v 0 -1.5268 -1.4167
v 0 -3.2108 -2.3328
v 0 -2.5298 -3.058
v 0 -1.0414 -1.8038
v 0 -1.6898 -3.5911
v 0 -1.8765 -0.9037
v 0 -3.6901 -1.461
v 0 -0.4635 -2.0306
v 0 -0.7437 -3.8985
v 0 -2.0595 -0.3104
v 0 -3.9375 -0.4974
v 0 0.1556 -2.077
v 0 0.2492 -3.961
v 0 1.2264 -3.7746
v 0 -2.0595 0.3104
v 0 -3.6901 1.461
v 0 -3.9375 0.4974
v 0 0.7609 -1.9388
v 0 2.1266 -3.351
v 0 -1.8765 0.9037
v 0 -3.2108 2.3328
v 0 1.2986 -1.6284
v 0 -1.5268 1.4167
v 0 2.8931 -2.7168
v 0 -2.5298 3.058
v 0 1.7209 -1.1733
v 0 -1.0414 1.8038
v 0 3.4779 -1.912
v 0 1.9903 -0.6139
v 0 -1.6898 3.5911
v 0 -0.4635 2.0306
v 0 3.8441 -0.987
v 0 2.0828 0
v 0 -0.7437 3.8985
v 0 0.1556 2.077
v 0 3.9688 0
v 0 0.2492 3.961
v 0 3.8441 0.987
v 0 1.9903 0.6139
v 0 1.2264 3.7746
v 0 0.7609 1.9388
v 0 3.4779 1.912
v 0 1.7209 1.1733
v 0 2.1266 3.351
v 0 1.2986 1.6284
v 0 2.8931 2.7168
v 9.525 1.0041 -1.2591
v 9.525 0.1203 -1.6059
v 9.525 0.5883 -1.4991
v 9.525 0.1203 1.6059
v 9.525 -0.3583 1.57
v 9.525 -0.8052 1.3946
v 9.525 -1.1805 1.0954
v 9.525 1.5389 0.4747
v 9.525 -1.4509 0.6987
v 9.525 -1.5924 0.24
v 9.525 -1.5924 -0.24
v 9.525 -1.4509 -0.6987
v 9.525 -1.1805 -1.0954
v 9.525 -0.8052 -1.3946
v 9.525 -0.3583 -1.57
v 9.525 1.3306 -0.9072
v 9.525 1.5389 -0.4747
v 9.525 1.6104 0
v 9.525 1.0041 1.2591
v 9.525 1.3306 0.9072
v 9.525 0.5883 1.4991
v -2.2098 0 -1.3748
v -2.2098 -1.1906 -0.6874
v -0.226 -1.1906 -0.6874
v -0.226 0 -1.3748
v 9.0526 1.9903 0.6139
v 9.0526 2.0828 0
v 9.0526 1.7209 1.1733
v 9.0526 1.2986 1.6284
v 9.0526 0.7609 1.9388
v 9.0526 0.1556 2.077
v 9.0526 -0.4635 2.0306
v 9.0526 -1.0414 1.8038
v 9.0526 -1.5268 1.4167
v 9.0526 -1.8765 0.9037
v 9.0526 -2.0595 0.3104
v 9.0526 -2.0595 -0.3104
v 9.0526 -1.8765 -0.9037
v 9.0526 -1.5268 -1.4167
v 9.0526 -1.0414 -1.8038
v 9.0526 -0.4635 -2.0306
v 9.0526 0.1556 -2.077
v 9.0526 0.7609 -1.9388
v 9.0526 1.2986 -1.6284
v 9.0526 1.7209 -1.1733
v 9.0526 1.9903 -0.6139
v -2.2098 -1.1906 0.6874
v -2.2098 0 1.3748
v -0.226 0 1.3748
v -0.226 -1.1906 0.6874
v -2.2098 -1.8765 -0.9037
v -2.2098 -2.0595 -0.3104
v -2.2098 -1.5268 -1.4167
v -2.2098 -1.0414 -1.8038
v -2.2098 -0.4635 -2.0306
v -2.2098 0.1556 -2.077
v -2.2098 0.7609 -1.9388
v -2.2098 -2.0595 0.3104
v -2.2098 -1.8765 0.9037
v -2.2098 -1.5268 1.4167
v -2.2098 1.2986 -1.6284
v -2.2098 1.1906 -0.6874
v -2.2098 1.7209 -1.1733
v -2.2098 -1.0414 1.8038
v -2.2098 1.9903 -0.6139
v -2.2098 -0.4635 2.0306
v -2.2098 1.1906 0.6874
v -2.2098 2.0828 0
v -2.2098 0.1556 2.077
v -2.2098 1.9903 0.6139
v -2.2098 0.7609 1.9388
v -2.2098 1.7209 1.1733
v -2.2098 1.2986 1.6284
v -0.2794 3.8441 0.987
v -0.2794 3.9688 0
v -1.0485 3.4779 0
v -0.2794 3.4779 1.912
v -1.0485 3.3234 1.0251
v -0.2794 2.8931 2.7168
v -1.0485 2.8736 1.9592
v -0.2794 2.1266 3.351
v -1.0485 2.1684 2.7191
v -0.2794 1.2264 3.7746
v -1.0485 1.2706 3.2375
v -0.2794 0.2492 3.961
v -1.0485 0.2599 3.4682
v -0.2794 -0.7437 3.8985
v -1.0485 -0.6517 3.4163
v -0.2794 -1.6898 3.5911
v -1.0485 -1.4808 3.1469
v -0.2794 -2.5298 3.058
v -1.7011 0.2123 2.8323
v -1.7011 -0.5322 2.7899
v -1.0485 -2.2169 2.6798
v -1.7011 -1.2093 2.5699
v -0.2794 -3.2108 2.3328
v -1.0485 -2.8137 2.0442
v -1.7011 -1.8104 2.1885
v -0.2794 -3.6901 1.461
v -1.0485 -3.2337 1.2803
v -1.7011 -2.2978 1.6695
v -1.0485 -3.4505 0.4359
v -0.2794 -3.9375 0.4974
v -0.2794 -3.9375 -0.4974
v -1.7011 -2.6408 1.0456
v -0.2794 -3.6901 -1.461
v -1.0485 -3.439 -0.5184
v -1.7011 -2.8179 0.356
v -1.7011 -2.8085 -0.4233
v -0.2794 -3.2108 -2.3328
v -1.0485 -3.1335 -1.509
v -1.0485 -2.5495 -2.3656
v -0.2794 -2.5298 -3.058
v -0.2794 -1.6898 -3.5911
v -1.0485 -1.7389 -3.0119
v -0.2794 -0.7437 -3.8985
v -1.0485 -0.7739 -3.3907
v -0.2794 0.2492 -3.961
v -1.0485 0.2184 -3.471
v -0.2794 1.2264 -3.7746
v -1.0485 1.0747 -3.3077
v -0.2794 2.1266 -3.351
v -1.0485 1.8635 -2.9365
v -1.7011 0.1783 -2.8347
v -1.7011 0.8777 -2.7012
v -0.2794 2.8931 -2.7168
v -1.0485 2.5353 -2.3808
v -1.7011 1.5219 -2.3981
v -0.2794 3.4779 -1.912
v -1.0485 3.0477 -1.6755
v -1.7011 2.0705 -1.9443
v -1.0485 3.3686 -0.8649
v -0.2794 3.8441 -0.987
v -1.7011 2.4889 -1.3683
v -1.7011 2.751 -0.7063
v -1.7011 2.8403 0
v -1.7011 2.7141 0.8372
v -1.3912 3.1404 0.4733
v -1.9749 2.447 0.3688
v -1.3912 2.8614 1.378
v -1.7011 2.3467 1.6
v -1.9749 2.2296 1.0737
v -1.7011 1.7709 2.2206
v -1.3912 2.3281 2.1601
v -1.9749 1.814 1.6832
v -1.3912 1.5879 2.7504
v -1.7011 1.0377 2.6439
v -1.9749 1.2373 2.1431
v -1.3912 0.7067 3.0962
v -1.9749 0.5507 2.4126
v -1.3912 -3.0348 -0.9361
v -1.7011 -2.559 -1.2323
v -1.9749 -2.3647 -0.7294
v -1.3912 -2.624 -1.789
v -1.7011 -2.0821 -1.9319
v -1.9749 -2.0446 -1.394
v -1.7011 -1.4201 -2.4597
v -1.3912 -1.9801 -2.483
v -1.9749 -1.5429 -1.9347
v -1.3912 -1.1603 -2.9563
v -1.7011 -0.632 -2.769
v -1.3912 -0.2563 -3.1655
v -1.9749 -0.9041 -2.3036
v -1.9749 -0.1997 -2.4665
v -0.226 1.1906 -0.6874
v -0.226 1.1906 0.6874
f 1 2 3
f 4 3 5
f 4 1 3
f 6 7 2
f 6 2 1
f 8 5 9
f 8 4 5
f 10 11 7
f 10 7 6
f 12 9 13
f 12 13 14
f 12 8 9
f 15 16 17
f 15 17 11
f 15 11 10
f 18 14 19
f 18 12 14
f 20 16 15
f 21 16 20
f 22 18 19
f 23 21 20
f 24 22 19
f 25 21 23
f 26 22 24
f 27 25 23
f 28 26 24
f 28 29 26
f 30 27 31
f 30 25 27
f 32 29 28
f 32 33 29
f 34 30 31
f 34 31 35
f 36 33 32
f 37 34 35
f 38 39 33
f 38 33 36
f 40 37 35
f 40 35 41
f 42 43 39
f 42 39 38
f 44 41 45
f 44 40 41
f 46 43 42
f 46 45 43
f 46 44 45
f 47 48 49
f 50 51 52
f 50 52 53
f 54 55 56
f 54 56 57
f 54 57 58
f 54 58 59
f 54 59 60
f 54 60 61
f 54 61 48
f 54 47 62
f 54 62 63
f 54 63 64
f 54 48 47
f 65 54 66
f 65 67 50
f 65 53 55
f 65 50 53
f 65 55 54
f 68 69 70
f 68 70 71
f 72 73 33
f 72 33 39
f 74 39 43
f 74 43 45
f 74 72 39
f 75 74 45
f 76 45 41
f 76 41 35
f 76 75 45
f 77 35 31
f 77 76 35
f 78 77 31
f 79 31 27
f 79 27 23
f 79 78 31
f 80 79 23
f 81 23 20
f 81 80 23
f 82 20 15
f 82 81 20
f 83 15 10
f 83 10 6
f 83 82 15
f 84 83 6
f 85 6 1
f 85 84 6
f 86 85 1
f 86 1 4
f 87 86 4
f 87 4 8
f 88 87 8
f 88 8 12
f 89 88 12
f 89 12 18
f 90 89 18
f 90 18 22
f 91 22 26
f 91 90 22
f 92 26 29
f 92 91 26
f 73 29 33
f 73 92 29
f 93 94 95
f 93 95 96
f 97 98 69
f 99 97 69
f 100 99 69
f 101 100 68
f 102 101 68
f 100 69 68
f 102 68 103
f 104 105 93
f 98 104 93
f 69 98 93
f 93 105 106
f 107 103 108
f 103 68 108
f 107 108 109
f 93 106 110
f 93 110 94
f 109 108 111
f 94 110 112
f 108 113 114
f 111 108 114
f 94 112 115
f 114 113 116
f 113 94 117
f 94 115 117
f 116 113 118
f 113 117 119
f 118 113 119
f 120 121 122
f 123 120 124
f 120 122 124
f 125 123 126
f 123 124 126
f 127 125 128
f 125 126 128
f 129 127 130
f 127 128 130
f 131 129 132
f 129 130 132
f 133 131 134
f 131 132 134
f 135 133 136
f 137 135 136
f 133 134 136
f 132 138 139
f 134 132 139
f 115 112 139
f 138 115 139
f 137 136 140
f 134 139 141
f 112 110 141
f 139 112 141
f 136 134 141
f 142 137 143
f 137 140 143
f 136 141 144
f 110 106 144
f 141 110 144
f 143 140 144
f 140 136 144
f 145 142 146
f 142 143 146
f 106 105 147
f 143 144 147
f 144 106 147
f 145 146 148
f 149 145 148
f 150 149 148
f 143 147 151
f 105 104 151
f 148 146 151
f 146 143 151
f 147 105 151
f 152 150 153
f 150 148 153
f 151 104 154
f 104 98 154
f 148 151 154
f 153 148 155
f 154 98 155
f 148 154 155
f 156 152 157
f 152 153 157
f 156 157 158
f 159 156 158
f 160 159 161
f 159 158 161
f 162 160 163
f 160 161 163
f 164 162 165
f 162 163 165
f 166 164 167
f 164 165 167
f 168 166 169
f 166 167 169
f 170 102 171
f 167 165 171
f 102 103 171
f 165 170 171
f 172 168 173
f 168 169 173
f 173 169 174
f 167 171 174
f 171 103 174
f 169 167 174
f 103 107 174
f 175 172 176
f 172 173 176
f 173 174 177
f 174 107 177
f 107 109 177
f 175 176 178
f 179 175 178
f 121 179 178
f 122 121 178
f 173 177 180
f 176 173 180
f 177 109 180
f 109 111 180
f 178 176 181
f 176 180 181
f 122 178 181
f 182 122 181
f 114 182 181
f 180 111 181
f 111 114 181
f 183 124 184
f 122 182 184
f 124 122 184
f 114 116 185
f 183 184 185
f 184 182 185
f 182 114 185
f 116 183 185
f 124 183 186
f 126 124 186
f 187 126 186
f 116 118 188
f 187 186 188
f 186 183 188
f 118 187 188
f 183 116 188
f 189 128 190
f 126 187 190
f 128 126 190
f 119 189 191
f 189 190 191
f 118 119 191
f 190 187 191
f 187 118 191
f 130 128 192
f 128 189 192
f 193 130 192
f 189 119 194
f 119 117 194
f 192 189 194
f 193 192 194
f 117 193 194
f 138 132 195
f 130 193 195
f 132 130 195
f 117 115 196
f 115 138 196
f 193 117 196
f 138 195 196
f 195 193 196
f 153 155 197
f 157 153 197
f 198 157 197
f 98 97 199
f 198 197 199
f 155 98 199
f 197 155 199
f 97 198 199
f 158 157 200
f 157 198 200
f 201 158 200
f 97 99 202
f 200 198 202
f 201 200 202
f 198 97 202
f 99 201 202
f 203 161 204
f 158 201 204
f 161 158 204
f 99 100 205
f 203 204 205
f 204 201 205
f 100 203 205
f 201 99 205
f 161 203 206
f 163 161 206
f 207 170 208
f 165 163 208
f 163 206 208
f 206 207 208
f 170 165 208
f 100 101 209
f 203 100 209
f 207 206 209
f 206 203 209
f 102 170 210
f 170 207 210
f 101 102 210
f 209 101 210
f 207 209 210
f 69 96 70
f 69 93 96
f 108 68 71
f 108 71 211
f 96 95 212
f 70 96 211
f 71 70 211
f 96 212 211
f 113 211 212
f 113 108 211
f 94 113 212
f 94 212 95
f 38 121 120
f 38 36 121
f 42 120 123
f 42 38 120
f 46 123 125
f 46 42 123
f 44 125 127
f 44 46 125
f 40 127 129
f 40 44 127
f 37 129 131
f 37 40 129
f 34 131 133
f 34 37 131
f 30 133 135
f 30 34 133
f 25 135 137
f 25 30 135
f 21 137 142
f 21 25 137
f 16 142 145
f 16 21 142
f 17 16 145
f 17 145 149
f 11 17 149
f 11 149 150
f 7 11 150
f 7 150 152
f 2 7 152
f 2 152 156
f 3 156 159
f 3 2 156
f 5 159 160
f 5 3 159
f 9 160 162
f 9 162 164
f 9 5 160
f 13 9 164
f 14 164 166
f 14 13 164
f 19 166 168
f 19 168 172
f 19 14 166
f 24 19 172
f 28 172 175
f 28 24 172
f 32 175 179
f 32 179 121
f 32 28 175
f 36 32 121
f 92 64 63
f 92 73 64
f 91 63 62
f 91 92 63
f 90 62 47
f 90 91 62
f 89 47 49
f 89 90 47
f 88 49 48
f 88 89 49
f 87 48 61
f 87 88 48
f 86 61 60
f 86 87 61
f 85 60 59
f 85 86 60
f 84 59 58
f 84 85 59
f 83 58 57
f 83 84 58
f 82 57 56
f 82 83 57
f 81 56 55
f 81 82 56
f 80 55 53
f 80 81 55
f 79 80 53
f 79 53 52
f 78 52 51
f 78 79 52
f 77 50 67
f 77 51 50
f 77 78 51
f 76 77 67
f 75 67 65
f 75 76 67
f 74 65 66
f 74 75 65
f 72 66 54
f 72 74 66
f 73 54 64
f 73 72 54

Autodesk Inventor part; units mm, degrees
sketch "Sketch_1" plane through (0, 0, 0) normal (0, 0, 1) x (1, 0, 0)
  line L0 (9.525, 0) -> (-2.2098, 0)
  line L1 (-2.2098, 0) -> (-2.2098, 2.0828)
  arc A0 (-0.2794, 3.9688) -> (-2.2098, 2.0828) centre (1.7151, -0.0037) ccw
  line L2 (-0.2794, 3.9688) -> (0, 3.9688)
  line L3 (0, 3.9688) -> (0, 2.0828)
  line L4 (0, 2.0828) -> (9.0526, 2.0828)
  line L5 (9.0526, 2.0828) -> (9.525, 1.6104)
  line L6 (9.525, 1.6104) -> (9.525, 0)
  line L7 (9.525, 0) -> (-2.2098, 0)
revolve "Revolution1" add sketch "Sketch_1" angle 360 about axis through (9.525, 0, 0) along (1, 0, 0)
thread "Thread1" size "8-32 UNC" class "2A" standard "ANSI Unified Screw Threads" length 8.2343
sketch "Sketch_3" plane through (-2.2098, 0, 0) normal (1, 0, 0) x (0, 0, -1)
  line L0 (-1.3748, 0) -> (-0.6874, -1.1906)
  line L1 (-0.6874, -1.1906) -> (0.6874, -1.1906)
  line L2 (0.6874, -1.1906) -> (1.3748, 0)
  line L3 (1.3748, 0) -> (0.6874, 1.1906)
  line L4 (0.6874, 1.1906) -> (-0.6874, 1.1906)
  line L5 (-0.6874, 1.1906) -> (-1.3748, 0)
extrude "Extrusion1" cut sketch "Sketch_3" along normal mid plane 3.9675
ref_plane "screw_XY" through (0, 0, 0) normal (1, 0, 0) x (0, 0, -1)
ref_plane "screw_YZ" through (0, 0, 0) normal (0, 0, -1) x (0, 1, 0)
ref_plane "screw_ZX" through (0, 0, 0) normal (0, 1, 0) x (1, 0, 0)
ref_plane "to_nut_XY" through (9.525, 0, 0) normal (1, 0, 0) x (0, 0, -1)
ref_plane "to_nut_YZ" through (9.525, 0, 0) normal (0, 0, -1) x (0, 1, 0)
ref_plane "to_nut_ZX" through (9.525, 0, 0) normal (0, 1, 0) x (1, 0, 0)
properties part number "3005"
